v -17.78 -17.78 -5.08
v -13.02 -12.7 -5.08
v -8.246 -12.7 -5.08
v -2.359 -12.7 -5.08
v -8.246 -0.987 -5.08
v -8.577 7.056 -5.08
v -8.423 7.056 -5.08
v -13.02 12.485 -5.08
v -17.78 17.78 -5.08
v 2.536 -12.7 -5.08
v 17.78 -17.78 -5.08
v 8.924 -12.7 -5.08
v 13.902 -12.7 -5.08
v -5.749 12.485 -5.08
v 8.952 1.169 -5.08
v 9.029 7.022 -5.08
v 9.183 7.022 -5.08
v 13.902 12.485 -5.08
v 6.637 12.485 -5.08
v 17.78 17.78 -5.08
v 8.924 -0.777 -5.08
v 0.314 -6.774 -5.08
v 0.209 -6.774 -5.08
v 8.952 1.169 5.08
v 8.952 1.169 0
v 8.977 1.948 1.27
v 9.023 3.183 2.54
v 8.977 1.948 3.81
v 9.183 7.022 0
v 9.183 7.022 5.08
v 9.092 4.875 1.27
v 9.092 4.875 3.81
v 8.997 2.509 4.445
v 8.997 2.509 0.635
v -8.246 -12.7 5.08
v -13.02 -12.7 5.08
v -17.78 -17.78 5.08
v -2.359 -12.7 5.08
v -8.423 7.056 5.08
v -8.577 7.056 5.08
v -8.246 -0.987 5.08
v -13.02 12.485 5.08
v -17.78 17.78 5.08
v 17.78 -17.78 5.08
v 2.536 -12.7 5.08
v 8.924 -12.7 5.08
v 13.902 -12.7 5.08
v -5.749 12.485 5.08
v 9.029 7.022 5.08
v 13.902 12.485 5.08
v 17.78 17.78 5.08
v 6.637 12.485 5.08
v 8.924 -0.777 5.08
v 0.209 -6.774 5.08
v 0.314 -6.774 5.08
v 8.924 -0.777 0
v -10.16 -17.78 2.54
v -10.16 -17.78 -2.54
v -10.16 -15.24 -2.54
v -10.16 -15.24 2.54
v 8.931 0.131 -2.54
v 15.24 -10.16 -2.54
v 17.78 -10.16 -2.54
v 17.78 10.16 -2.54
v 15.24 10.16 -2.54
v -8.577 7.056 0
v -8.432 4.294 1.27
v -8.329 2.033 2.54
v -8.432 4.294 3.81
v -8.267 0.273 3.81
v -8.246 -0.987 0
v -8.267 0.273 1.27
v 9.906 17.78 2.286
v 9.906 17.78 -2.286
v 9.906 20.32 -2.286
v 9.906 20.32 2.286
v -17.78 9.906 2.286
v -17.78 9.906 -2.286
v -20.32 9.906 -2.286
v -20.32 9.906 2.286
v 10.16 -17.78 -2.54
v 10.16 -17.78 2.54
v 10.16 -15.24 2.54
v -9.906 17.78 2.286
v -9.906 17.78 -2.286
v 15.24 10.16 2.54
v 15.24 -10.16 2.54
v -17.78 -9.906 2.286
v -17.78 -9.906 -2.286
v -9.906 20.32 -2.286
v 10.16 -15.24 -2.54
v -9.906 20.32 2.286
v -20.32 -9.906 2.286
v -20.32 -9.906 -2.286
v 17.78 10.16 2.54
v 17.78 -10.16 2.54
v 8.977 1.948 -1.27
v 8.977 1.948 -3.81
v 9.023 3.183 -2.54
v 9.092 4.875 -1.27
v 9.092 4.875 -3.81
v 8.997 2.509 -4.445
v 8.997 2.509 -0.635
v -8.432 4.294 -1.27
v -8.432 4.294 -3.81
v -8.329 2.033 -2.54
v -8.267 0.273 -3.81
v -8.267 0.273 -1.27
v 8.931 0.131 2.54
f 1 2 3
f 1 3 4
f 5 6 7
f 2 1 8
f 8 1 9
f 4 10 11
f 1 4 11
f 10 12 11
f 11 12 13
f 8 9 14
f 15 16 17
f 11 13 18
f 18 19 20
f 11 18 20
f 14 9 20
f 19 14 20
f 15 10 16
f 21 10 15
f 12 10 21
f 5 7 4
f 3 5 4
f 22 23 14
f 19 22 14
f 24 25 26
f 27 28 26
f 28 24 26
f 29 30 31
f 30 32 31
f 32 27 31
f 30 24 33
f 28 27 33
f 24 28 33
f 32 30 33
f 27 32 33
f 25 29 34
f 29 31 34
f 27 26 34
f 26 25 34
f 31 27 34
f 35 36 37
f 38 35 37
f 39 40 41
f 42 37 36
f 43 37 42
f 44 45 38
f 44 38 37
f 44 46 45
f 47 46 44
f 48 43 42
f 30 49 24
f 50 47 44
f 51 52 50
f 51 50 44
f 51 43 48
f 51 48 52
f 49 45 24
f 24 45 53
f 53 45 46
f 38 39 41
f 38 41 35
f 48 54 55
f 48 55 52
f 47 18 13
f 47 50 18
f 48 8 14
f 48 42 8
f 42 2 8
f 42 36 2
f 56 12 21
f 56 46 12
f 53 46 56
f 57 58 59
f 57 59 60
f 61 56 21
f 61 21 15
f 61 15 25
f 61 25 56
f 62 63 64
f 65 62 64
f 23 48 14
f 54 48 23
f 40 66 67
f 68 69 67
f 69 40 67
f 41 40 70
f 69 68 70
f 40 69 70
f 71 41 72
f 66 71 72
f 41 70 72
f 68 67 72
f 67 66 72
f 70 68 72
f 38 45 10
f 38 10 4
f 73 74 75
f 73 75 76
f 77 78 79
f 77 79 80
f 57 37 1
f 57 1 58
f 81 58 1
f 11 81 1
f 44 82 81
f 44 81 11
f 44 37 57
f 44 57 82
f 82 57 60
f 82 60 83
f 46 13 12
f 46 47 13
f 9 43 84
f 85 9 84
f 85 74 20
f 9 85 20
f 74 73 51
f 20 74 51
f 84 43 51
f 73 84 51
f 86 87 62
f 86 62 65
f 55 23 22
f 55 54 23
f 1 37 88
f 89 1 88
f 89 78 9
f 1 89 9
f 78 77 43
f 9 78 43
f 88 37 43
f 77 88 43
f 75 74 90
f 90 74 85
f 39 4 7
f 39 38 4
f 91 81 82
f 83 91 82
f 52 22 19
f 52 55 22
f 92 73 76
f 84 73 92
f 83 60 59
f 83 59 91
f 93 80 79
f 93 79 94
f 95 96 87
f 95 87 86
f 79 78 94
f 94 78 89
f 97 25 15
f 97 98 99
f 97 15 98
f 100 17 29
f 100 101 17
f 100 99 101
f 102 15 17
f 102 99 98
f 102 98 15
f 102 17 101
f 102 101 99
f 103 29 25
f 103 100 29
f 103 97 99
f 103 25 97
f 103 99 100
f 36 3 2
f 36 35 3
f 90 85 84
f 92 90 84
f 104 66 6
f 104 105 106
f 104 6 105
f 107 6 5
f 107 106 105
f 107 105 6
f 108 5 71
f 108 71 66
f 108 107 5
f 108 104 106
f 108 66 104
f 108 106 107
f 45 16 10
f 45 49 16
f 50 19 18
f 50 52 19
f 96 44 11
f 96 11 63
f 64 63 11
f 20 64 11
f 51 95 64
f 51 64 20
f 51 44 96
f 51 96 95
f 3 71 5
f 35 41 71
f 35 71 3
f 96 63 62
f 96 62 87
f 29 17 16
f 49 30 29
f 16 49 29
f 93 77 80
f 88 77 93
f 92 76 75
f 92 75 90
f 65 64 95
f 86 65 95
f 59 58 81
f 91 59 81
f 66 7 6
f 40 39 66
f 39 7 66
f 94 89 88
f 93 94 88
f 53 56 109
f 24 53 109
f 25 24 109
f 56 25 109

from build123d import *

# Parameters (mm, degrees)
F0_W     = 35.56
F0_H     = 35.56
F1_DEPTH = 5.08
F2_W     = 19.812
F2_H     = 4.572
F3_DEPTH = 2.54
F4_W     = 19.812
F4_H     = 4.572
F5_DEPTH = 2.54
F6_W     = 20.32
F6_H     = 5.08
F7_DEPTH = 2.54
F8_W     = 20.32
F8_H     = 5.08
F9_DEPTH = 2.54


with BuildPart() as f1:
    # F0 (on Top) → F1 (new body, symmetric)
    with BuildSketch(Plane.XY):
        Rectangle(F0_W, F0_H)
        with BuildLine():
            Line((2.5355902778, -12.7), (-2.3592013889, -12.7))
            Line((-2.3592013889, -12.7), (-8.4225694444, 7.0555555556))
            Line((-8.4225694444, 7.0555555556), (-8.5769097222, 7.0555555556))
            add(Edge.make_bspline(
                [(-8.5769097222, 7.0555555556), (-8.2461805556, 1.0307725694), (-8.2461805556, -0.9866753472)],
                knots=[0, 0, 0, 1, 1, 1], degree=2))
            Line((-8.2461805556, -0.9866753472), (-8.2461805556, -12.7))
            Line((-8.2461805556, -12.7), (-13.0197048611, -12.7))
            Line((-13.0197048611, -12.7), (-13.0197048611, 12.4850260417))
            Line((-13.0197048611, 12.4850260417), (-5.7491753472, 12.4850260417))
            Line((-5.7491753472, 12.4850260417), (0.2094618056, -6.7744357639))
            Line((0.2094618056, -6.7744357639), (0.3141927083, -6.7744357639))
            Line((0.3141927083, -6.7744357639), (6.6366319444, 12.4850260417))
            Line((6.6366319444, 12.4850260417), (13.9016493056, 12.4850260417))
            Line((13.9016493056, 12.4850260417), (13.9016493056, -12.7))
            Line((13.9016493056, -12.7), (8.9241753472, -12.7))
            Line((8.9241753472, -12.7), (8.9241753472, -0.7772135417))
            add(Edge.make_bspline(
                [(8.9241753472, -0.7772135417), (8.9241753472, 0.0661458333), (8.9517361111, 1.1685763889)],
                knots=[0, 0, 0, 1, 1, 1], degree=2))
            add(Edge.make_bspline(
                [(8.9517361111, 1.1685763889), (8.979296875, 2.2710069444), (9.1832465278, 7.0224826389)],
                knots=[0, 0, 0, 1, 1, 1], degree=2))
            Line((9.1832465278, 7.0224826389), (9.02890625, 7.0224826389))
            Line((9.02890625, 7.0224826389), (2.5355902778, -12.7))
        make_face(mode=Mode.SUBTRACT)
    extrude(amount=F1_DEPTH, both=True)

    # F2 (on face) → F3 (join)
    with BuildSketch(Plane(origin=(0, 17.78, 0), x_dir=(-1, 0, 0), z_dir=(0, 1, 0))):
        Rectangle(F2_W, F2_H)
    extrude(amount=F3_DEPTH)

    # F4 (on face) → F5 (join)
    with BuildSketch(Plane(origin=(-17.78, 0, 0), x_dir=(0, -1, 0), z_dir=(-1, 0, 0))):
        Rectangle(F4_W, F4_H)
    extrude(amount=F5_DEPTH)

    # F6 (on face) → F7 (cut)
    with BuildSketch(Plane.XZ.offset(17.78)):
        Rectangle(F6_W, F6_H)
    extrude(amount=-F7_DEPTH, mode=Mode.SUBTRACT)

    # F8 (on face) → F9 (cut)
    with BuildSketch(Plane.YZ.offset(17.78)):
        Rectangle(F8_W, F8_H)
    extrude(amount=-F9_DEPTH, mode=Mode.SUBTRACT)


solid = f1.part
